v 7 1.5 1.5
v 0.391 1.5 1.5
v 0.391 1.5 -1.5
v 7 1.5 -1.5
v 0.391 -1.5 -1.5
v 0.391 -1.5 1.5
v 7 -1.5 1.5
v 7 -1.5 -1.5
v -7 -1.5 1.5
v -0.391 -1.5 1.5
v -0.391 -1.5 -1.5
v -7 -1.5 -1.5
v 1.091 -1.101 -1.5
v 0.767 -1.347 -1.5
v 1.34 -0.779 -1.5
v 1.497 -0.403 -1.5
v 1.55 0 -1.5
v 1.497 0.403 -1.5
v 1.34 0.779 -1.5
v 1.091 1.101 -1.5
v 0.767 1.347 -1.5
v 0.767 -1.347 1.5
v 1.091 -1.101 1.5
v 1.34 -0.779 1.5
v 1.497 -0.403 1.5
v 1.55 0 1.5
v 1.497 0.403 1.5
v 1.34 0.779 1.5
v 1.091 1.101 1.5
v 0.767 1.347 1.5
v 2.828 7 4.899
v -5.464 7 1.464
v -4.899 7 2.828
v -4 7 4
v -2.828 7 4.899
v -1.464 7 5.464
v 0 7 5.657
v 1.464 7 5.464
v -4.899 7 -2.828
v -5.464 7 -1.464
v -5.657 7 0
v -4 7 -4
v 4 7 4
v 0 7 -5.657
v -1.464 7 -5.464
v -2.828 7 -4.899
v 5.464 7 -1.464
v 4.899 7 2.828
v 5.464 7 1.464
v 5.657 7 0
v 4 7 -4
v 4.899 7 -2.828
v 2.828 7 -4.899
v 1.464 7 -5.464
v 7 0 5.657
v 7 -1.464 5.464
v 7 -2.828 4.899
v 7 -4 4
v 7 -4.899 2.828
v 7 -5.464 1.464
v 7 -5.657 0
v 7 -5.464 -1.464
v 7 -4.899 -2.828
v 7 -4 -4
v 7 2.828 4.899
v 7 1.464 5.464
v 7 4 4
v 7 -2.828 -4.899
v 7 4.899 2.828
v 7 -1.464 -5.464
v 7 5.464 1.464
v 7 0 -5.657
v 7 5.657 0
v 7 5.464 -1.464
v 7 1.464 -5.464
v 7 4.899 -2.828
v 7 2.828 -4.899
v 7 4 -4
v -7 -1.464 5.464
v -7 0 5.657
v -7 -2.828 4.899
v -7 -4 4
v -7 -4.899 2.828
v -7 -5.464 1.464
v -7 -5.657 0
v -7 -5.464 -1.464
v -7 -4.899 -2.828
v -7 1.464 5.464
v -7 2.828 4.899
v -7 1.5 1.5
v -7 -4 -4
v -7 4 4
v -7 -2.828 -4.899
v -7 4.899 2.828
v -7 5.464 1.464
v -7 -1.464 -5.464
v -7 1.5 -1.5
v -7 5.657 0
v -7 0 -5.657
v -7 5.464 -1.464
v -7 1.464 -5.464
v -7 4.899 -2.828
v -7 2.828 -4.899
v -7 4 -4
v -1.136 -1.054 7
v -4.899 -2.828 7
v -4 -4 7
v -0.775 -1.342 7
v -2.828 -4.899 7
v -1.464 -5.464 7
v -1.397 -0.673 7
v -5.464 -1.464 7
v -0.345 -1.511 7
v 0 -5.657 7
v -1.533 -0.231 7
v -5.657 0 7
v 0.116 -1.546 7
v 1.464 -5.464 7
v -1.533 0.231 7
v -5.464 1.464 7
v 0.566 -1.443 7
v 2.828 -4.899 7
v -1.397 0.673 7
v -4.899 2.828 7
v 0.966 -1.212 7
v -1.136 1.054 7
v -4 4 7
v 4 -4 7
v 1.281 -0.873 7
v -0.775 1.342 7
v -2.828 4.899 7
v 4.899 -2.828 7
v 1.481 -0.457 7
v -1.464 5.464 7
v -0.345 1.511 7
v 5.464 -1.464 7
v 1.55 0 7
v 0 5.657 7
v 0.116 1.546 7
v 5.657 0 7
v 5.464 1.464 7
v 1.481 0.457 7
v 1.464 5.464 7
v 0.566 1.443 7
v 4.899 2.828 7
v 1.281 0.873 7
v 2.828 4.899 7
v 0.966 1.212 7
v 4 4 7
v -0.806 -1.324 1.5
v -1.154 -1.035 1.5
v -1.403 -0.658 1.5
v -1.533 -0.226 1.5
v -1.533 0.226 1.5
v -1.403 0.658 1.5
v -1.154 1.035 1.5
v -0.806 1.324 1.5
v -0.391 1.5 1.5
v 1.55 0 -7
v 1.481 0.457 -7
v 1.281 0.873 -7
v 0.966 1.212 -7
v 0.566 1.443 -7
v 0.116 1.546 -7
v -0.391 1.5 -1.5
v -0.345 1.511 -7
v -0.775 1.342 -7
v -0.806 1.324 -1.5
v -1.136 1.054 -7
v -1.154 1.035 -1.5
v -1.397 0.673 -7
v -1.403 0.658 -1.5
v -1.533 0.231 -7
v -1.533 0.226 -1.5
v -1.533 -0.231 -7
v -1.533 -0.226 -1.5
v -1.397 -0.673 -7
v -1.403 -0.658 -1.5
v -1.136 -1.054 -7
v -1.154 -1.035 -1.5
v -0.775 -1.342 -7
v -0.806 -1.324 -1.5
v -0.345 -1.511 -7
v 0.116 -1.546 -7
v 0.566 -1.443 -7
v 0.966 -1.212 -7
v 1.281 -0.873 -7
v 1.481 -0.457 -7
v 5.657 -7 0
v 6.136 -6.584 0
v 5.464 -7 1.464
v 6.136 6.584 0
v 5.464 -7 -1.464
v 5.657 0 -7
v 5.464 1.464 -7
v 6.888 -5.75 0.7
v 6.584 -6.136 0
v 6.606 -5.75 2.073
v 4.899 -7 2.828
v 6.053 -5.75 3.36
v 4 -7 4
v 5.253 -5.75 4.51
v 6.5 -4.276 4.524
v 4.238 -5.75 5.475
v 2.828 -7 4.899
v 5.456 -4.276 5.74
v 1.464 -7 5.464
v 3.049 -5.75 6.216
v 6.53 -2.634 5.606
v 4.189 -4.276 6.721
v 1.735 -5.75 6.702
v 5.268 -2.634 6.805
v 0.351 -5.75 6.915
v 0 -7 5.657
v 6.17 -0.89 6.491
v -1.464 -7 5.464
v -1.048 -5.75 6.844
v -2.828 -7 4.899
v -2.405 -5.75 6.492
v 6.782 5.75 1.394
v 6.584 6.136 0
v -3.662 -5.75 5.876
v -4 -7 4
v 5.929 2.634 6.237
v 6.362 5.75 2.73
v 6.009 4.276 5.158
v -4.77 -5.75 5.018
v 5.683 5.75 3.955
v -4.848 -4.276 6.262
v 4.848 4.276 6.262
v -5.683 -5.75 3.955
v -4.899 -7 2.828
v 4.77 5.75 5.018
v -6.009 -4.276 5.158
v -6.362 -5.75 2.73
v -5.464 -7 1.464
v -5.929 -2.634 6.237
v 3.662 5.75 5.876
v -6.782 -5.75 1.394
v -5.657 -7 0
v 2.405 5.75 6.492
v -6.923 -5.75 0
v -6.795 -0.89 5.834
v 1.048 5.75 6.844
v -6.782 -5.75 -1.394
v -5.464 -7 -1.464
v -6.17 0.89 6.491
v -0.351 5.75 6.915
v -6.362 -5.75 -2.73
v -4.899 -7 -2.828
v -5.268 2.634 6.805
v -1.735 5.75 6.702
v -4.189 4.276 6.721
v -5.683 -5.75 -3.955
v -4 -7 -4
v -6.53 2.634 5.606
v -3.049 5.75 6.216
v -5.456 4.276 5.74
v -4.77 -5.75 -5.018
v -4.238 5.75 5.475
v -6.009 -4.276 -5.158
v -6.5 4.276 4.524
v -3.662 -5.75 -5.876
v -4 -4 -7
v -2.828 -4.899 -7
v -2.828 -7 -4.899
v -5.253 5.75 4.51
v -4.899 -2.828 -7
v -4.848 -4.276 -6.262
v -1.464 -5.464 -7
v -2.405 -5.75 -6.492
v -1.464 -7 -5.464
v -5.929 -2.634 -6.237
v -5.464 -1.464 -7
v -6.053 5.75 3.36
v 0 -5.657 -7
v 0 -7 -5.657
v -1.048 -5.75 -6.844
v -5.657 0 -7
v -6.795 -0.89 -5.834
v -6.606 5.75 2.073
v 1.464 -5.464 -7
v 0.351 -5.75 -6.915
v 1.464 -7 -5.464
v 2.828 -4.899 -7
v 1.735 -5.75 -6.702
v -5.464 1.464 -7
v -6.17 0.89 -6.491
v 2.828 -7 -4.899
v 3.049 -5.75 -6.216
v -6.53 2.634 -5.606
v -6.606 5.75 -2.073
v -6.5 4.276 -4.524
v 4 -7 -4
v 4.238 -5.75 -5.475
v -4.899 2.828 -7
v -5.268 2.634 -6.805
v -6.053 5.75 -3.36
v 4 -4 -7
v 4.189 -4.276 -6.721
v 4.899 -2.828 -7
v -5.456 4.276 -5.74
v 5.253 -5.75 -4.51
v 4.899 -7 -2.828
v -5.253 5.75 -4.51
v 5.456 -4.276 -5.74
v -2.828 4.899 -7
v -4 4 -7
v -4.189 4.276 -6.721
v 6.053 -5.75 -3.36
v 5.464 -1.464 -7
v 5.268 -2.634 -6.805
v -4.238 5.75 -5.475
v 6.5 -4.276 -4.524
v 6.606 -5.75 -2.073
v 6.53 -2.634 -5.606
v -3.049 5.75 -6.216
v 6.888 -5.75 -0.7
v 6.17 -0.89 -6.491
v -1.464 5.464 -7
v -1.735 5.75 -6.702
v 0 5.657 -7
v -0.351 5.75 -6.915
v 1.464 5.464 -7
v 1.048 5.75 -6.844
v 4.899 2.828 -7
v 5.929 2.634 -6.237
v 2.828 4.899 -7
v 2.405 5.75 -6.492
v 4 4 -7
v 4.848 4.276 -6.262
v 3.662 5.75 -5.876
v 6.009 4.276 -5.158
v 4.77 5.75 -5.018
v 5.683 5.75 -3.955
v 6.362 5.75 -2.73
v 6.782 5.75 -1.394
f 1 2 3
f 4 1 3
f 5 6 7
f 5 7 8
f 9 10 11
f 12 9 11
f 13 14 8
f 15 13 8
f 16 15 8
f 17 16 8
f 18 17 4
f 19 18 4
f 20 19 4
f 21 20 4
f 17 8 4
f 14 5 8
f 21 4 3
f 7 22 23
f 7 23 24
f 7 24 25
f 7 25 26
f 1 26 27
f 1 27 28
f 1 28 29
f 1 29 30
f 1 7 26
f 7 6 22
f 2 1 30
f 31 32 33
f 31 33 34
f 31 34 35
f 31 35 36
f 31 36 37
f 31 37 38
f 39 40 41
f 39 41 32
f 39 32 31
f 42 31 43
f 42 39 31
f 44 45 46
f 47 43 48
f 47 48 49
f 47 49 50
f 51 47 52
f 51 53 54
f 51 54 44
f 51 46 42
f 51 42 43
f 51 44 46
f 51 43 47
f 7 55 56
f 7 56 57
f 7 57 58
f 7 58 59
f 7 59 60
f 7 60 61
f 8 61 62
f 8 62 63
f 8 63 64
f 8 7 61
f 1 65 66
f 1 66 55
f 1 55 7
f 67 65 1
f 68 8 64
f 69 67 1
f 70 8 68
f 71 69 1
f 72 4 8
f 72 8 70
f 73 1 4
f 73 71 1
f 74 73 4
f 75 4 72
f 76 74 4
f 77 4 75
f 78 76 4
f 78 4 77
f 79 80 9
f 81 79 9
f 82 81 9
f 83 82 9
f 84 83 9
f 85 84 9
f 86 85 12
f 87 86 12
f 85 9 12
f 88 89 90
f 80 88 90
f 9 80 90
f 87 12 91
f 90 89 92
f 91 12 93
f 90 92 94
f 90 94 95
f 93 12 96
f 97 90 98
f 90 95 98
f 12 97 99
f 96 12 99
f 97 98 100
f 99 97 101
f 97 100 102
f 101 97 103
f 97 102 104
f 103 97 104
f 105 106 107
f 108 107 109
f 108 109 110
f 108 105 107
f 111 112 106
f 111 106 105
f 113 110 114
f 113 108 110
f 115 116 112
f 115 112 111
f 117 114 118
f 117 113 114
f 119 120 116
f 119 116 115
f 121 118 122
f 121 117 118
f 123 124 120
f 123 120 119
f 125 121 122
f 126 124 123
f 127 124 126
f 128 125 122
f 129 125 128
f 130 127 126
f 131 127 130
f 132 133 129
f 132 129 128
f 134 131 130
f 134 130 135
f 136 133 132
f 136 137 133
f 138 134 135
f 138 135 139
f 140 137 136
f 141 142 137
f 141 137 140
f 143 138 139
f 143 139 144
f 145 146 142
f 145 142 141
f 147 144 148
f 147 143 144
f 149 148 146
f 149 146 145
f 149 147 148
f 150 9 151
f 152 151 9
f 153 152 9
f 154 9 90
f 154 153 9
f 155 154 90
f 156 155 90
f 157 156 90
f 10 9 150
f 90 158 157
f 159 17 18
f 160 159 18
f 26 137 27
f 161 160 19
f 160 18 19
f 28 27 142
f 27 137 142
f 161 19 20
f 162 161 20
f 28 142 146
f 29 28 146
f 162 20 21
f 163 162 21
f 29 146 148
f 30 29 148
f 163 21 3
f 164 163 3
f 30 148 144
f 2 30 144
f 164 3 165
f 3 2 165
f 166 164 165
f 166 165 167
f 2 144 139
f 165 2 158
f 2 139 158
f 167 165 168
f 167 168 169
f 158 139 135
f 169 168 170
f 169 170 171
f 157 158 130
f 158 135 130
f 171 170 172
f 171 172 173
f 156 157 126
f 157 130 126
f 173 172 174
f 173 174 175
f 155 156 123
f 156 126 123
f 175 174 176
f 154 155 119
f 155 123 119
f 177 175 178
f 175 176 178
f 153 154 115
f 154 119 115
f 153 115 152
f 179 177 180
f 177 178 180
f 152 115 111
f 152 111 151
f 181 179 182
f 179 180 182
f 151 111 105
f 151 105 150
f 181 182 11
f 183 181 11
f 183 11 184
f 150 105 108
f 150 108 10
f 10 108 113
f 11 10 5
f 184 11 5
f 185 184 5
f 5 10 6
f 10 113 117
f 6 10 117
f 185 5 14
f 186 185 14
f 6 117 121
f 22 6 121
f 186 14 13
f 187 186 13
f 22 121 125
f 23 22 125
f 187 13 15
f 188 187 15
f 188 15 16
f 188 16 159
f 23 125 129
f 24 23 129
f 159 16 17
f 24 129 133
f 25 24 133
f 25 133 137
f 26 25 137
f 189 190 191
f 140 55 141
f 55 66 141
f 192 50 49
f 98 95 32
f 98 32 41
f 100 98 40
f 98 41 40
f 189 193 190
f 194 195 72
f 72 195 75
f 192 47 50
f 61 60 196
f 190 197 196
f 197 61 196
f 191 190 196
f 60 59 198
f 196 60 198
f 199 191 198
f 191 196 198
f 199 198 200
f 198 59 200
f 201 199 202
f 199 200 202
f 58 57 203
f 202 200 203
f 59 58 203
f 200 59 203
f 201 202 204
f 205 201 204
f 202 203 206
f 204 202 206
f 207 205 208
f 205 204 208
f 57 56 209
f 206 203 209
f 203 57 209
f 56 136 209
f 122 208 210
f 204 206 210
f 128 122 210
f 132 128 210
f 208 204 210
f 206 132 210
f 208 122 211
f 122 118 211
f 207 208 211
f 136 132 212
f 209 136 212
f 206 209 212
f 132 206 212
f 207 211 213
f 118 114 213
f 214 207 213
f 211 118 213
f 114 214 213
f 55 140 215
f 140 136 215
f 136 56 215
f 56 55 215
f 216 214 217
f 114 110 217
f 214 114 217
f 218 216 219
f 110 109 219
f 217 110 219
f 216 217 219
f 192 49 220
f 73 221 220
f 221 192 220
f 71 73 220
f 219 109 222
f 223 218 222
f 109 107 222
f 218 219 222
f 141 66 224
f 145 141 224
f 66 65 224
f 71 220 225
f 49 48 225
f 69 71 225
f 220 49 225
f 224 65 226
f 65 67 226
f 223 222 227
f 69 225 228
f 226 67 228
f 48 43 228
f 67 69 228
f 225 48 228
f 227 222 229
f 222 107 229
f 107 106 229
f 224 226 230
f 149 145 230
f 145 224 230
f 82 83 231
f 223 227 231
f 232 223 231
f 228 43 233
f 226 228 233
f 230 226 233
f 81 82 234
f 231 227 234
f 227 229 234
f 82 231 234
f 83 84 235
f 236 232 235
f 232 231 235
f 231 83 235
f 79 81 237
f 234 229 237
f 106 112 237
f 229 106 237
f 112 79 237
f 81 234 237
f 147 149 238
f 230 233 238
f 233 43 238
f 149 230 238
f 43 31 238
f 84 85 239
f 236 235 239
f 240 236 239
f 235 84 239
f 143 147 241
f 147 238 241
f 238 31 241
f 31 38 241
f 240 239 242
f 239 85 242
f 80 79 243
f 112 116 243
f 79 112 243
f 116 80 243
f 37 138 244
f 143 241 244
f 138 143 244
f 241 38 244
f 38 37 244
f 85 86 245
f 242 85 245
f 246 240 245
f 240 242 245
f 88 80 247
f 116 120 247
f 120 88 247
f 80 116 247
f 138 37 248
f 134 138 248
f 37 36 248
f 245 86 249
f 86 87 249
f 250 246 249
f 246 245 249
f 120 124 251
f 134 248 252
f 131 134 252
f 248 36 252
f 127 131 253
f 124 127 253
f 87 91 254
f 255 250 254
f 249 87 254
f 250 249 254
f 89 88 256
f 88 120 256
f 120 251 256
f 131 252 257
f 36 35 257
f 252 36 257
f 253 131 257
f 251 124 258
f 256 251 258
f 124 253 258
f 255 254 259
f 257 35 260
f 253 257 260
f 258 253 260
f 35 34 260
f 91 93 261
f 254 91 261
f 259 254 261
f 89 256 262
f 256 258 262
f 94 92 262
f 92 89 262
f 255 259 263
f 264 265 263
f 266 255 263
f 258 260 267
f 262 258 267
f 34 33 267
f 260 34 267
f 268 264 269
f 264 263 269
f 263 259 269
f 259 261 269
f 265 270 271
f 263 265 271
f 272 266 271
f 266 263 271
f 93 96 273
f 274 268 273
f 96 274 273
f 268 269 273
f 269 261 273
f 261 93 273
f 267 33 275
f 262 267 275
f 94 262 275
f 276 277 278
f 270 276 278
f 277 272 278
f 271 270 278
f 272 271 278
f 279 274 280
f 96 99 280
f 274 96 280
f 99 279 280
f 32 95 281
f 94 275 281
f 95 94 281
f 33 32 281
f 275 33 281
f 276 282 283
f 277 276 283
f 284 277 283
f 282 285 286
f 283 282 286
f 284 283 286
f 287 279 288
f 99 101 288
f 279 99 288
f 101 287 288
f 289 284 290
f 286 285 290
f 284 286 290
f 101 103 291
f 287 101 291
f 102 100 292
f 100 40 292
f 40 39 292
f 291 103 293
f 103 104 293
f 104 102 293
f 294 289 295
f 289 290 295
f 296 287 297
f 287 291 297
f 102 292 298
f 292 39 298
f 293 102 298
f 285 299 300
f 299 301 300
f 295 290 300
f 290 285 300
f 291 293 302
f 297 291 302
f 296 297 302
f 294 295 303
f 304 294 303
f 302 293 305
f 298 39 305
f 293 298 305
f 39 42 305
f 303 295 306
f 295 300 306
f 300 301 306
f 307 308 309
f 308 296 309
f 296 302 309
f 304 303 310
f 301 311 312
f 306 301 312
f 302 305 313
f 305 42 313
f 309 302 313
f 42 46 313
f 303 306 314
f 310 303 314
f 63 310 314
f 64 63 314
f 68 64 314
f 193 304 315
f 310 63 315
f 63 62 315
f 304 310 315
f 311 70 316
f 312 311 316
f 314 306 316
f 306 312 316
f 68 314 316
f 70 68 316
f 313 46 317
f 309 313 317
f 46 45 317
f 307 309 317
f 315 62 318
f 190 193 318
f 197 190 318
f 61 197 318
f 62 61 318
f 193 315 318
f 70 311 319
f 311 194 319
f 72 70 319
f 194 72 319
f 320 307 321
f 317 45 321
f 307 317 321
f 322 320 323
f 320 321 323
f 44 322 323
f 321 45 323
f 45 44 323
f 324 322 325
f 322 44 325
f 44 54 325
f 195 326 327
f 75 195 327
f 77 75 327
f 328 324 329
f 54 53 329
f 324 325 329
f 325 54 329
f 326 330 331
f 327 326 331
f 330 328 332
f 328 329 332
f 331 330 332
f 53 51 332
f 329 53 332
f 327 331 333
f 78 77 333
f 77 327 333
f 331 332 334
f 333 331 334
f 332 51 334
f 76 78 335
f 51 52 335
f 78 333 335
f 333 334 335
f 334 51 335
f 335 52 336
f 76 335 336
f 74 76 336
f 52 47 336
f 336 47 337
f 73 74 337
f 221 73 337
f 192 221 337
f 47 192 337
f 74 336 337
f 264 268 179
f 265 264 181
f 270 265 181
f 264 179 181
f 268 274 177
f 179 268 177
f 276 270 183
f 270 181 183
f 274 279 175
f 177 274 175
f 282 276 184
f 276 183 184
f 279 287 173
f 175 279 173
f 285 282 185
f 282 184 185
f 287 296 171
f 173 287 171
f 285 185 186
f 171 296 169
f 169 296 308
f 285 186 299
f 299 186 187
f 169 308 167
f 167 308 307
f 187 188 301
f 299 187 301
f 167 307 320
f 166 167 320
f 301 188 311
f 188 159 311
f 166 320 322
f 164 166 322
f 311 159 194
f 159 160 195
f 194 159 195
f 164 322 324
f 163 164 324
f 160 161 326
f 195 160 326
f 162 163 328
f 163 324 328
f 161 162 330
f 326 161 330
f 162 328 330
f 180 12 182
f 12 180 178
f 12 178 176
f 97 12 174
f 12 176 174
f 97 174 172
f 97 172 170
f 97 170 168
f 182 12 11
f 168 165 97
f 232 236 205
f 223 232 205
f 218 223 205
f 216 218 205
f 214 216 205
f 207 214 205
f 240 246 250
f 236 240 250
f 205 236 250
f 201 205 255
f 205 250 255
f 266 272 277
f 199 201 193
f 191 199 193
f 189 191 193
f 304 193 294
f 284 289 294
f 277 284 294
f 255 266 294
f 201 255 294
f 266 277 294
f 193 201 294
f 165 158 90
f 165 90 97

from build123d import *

# Parameters (mm, degrees)
SKETCH_6_R          = 10
CUT_EXTRUDE_4_DEPTH = 2
SKETCH_7_R          = 10
CUT_EXTRUDE_5_DEPTH = 2
SKETCH_8_R          = 10
CUT_EXTRUDE_6_DEPTH = 2
SKETCH_9_R          = 1.55
CUT_EXTRUDE_7_DEPTH = 15
SKETCH_11_W         = 3
SKETCH_11_H         = 3
CUT_EXTRUDE_9_DEPTH = 15


with BuildPart() as part:
    # 스케치1 → 회전42 (revolve)
    with BuildSketch(Plane.XY):
        with BuildLine():
            Line((0, 9), (0, -9))
            ThreePointArc((0, -9), (9, 0), (0, 9))
        make_face()
    revolve(axis=Axis((0, 9, 0), (0, -1, 0)))

    # 스케치6 → 컷-돌출4 (cut)
    with BuildSketch(Plane.XY.offset(9)):
        Circle(SKETCH_6_R)
    cut_extrude_4 = extrude(amount=-CUT_EXTRUDE_4_DEPTH, mode=Mode.SUBTRACT)

    # 대칭 복사4: 컷-돌출4 across plane
    add(cut_extrude_4.mirror(Plane.XY), mode=Mode.SUBTRACT)

    # 스케치7 → 컷-돌출5 (cut)
    with BuildSketch(Plane(origin=(0, 9, 0), x_dir=(1, 0, 0), z_dir=(0, 1, 0))):
        Circle(SKETCH_7_R)
    cut_extrude_5 = extrude(amount=-CUT_EXTRUDE_5_DEPTH, mode=Mode.SUBTRACT)

    # 대칭 복사5: 컷-돌출5 across plane
    add(cut_extrude_5.mirror(Plane.ZX), mode=Mode.SUBTRACT)

    # 스케치8 → 컷-돌출6 (cut)
    with BuildSketch(Plane(origin=(9, 0, 0), x_dir=(0, 0, -1), z_dir=(1, 0, 0))):
        Circle(SKETCH_8_R)
    cut_extrude_6 = extrude(amount=-CUT_EXTRUDE_6_DEPTH, mode=Mode.SUBTRACT)

    # 대칭 복사6: 컷-돌출6 across plane
    add(cut_extrude_6.mirror(Plane(origin=(0, 0, 0), x_dir=(0, 0, 1), z_dir=(1, 0, 0))), mode=Mode.SUBTRACT)

    # 스케치9 → 컷-돌출7 (cut, through all)
    with BuildSketch(Plane.XY.offset(7)):
        Circle(SKETCH_9_R)
    extrude(amount=-CUT_EXTRUDE_7_DEPTH, mode=Mode.SUBTRACT)

    # 스케치11 → 컷-돌출9 (cut, through all)
    with BuildSketch(Plane(origin=(7, 0, 0), x_dir=(0, 0, -1), z_dir=(1, 0, 0))):
        Rectangle(SKETCH_11_W, SKETCH_11_H)
    extrude(amount=-CUT_EXTRUDE_9_DEPTH, mode=Mode.SUBTRACT)


solid = part.part
